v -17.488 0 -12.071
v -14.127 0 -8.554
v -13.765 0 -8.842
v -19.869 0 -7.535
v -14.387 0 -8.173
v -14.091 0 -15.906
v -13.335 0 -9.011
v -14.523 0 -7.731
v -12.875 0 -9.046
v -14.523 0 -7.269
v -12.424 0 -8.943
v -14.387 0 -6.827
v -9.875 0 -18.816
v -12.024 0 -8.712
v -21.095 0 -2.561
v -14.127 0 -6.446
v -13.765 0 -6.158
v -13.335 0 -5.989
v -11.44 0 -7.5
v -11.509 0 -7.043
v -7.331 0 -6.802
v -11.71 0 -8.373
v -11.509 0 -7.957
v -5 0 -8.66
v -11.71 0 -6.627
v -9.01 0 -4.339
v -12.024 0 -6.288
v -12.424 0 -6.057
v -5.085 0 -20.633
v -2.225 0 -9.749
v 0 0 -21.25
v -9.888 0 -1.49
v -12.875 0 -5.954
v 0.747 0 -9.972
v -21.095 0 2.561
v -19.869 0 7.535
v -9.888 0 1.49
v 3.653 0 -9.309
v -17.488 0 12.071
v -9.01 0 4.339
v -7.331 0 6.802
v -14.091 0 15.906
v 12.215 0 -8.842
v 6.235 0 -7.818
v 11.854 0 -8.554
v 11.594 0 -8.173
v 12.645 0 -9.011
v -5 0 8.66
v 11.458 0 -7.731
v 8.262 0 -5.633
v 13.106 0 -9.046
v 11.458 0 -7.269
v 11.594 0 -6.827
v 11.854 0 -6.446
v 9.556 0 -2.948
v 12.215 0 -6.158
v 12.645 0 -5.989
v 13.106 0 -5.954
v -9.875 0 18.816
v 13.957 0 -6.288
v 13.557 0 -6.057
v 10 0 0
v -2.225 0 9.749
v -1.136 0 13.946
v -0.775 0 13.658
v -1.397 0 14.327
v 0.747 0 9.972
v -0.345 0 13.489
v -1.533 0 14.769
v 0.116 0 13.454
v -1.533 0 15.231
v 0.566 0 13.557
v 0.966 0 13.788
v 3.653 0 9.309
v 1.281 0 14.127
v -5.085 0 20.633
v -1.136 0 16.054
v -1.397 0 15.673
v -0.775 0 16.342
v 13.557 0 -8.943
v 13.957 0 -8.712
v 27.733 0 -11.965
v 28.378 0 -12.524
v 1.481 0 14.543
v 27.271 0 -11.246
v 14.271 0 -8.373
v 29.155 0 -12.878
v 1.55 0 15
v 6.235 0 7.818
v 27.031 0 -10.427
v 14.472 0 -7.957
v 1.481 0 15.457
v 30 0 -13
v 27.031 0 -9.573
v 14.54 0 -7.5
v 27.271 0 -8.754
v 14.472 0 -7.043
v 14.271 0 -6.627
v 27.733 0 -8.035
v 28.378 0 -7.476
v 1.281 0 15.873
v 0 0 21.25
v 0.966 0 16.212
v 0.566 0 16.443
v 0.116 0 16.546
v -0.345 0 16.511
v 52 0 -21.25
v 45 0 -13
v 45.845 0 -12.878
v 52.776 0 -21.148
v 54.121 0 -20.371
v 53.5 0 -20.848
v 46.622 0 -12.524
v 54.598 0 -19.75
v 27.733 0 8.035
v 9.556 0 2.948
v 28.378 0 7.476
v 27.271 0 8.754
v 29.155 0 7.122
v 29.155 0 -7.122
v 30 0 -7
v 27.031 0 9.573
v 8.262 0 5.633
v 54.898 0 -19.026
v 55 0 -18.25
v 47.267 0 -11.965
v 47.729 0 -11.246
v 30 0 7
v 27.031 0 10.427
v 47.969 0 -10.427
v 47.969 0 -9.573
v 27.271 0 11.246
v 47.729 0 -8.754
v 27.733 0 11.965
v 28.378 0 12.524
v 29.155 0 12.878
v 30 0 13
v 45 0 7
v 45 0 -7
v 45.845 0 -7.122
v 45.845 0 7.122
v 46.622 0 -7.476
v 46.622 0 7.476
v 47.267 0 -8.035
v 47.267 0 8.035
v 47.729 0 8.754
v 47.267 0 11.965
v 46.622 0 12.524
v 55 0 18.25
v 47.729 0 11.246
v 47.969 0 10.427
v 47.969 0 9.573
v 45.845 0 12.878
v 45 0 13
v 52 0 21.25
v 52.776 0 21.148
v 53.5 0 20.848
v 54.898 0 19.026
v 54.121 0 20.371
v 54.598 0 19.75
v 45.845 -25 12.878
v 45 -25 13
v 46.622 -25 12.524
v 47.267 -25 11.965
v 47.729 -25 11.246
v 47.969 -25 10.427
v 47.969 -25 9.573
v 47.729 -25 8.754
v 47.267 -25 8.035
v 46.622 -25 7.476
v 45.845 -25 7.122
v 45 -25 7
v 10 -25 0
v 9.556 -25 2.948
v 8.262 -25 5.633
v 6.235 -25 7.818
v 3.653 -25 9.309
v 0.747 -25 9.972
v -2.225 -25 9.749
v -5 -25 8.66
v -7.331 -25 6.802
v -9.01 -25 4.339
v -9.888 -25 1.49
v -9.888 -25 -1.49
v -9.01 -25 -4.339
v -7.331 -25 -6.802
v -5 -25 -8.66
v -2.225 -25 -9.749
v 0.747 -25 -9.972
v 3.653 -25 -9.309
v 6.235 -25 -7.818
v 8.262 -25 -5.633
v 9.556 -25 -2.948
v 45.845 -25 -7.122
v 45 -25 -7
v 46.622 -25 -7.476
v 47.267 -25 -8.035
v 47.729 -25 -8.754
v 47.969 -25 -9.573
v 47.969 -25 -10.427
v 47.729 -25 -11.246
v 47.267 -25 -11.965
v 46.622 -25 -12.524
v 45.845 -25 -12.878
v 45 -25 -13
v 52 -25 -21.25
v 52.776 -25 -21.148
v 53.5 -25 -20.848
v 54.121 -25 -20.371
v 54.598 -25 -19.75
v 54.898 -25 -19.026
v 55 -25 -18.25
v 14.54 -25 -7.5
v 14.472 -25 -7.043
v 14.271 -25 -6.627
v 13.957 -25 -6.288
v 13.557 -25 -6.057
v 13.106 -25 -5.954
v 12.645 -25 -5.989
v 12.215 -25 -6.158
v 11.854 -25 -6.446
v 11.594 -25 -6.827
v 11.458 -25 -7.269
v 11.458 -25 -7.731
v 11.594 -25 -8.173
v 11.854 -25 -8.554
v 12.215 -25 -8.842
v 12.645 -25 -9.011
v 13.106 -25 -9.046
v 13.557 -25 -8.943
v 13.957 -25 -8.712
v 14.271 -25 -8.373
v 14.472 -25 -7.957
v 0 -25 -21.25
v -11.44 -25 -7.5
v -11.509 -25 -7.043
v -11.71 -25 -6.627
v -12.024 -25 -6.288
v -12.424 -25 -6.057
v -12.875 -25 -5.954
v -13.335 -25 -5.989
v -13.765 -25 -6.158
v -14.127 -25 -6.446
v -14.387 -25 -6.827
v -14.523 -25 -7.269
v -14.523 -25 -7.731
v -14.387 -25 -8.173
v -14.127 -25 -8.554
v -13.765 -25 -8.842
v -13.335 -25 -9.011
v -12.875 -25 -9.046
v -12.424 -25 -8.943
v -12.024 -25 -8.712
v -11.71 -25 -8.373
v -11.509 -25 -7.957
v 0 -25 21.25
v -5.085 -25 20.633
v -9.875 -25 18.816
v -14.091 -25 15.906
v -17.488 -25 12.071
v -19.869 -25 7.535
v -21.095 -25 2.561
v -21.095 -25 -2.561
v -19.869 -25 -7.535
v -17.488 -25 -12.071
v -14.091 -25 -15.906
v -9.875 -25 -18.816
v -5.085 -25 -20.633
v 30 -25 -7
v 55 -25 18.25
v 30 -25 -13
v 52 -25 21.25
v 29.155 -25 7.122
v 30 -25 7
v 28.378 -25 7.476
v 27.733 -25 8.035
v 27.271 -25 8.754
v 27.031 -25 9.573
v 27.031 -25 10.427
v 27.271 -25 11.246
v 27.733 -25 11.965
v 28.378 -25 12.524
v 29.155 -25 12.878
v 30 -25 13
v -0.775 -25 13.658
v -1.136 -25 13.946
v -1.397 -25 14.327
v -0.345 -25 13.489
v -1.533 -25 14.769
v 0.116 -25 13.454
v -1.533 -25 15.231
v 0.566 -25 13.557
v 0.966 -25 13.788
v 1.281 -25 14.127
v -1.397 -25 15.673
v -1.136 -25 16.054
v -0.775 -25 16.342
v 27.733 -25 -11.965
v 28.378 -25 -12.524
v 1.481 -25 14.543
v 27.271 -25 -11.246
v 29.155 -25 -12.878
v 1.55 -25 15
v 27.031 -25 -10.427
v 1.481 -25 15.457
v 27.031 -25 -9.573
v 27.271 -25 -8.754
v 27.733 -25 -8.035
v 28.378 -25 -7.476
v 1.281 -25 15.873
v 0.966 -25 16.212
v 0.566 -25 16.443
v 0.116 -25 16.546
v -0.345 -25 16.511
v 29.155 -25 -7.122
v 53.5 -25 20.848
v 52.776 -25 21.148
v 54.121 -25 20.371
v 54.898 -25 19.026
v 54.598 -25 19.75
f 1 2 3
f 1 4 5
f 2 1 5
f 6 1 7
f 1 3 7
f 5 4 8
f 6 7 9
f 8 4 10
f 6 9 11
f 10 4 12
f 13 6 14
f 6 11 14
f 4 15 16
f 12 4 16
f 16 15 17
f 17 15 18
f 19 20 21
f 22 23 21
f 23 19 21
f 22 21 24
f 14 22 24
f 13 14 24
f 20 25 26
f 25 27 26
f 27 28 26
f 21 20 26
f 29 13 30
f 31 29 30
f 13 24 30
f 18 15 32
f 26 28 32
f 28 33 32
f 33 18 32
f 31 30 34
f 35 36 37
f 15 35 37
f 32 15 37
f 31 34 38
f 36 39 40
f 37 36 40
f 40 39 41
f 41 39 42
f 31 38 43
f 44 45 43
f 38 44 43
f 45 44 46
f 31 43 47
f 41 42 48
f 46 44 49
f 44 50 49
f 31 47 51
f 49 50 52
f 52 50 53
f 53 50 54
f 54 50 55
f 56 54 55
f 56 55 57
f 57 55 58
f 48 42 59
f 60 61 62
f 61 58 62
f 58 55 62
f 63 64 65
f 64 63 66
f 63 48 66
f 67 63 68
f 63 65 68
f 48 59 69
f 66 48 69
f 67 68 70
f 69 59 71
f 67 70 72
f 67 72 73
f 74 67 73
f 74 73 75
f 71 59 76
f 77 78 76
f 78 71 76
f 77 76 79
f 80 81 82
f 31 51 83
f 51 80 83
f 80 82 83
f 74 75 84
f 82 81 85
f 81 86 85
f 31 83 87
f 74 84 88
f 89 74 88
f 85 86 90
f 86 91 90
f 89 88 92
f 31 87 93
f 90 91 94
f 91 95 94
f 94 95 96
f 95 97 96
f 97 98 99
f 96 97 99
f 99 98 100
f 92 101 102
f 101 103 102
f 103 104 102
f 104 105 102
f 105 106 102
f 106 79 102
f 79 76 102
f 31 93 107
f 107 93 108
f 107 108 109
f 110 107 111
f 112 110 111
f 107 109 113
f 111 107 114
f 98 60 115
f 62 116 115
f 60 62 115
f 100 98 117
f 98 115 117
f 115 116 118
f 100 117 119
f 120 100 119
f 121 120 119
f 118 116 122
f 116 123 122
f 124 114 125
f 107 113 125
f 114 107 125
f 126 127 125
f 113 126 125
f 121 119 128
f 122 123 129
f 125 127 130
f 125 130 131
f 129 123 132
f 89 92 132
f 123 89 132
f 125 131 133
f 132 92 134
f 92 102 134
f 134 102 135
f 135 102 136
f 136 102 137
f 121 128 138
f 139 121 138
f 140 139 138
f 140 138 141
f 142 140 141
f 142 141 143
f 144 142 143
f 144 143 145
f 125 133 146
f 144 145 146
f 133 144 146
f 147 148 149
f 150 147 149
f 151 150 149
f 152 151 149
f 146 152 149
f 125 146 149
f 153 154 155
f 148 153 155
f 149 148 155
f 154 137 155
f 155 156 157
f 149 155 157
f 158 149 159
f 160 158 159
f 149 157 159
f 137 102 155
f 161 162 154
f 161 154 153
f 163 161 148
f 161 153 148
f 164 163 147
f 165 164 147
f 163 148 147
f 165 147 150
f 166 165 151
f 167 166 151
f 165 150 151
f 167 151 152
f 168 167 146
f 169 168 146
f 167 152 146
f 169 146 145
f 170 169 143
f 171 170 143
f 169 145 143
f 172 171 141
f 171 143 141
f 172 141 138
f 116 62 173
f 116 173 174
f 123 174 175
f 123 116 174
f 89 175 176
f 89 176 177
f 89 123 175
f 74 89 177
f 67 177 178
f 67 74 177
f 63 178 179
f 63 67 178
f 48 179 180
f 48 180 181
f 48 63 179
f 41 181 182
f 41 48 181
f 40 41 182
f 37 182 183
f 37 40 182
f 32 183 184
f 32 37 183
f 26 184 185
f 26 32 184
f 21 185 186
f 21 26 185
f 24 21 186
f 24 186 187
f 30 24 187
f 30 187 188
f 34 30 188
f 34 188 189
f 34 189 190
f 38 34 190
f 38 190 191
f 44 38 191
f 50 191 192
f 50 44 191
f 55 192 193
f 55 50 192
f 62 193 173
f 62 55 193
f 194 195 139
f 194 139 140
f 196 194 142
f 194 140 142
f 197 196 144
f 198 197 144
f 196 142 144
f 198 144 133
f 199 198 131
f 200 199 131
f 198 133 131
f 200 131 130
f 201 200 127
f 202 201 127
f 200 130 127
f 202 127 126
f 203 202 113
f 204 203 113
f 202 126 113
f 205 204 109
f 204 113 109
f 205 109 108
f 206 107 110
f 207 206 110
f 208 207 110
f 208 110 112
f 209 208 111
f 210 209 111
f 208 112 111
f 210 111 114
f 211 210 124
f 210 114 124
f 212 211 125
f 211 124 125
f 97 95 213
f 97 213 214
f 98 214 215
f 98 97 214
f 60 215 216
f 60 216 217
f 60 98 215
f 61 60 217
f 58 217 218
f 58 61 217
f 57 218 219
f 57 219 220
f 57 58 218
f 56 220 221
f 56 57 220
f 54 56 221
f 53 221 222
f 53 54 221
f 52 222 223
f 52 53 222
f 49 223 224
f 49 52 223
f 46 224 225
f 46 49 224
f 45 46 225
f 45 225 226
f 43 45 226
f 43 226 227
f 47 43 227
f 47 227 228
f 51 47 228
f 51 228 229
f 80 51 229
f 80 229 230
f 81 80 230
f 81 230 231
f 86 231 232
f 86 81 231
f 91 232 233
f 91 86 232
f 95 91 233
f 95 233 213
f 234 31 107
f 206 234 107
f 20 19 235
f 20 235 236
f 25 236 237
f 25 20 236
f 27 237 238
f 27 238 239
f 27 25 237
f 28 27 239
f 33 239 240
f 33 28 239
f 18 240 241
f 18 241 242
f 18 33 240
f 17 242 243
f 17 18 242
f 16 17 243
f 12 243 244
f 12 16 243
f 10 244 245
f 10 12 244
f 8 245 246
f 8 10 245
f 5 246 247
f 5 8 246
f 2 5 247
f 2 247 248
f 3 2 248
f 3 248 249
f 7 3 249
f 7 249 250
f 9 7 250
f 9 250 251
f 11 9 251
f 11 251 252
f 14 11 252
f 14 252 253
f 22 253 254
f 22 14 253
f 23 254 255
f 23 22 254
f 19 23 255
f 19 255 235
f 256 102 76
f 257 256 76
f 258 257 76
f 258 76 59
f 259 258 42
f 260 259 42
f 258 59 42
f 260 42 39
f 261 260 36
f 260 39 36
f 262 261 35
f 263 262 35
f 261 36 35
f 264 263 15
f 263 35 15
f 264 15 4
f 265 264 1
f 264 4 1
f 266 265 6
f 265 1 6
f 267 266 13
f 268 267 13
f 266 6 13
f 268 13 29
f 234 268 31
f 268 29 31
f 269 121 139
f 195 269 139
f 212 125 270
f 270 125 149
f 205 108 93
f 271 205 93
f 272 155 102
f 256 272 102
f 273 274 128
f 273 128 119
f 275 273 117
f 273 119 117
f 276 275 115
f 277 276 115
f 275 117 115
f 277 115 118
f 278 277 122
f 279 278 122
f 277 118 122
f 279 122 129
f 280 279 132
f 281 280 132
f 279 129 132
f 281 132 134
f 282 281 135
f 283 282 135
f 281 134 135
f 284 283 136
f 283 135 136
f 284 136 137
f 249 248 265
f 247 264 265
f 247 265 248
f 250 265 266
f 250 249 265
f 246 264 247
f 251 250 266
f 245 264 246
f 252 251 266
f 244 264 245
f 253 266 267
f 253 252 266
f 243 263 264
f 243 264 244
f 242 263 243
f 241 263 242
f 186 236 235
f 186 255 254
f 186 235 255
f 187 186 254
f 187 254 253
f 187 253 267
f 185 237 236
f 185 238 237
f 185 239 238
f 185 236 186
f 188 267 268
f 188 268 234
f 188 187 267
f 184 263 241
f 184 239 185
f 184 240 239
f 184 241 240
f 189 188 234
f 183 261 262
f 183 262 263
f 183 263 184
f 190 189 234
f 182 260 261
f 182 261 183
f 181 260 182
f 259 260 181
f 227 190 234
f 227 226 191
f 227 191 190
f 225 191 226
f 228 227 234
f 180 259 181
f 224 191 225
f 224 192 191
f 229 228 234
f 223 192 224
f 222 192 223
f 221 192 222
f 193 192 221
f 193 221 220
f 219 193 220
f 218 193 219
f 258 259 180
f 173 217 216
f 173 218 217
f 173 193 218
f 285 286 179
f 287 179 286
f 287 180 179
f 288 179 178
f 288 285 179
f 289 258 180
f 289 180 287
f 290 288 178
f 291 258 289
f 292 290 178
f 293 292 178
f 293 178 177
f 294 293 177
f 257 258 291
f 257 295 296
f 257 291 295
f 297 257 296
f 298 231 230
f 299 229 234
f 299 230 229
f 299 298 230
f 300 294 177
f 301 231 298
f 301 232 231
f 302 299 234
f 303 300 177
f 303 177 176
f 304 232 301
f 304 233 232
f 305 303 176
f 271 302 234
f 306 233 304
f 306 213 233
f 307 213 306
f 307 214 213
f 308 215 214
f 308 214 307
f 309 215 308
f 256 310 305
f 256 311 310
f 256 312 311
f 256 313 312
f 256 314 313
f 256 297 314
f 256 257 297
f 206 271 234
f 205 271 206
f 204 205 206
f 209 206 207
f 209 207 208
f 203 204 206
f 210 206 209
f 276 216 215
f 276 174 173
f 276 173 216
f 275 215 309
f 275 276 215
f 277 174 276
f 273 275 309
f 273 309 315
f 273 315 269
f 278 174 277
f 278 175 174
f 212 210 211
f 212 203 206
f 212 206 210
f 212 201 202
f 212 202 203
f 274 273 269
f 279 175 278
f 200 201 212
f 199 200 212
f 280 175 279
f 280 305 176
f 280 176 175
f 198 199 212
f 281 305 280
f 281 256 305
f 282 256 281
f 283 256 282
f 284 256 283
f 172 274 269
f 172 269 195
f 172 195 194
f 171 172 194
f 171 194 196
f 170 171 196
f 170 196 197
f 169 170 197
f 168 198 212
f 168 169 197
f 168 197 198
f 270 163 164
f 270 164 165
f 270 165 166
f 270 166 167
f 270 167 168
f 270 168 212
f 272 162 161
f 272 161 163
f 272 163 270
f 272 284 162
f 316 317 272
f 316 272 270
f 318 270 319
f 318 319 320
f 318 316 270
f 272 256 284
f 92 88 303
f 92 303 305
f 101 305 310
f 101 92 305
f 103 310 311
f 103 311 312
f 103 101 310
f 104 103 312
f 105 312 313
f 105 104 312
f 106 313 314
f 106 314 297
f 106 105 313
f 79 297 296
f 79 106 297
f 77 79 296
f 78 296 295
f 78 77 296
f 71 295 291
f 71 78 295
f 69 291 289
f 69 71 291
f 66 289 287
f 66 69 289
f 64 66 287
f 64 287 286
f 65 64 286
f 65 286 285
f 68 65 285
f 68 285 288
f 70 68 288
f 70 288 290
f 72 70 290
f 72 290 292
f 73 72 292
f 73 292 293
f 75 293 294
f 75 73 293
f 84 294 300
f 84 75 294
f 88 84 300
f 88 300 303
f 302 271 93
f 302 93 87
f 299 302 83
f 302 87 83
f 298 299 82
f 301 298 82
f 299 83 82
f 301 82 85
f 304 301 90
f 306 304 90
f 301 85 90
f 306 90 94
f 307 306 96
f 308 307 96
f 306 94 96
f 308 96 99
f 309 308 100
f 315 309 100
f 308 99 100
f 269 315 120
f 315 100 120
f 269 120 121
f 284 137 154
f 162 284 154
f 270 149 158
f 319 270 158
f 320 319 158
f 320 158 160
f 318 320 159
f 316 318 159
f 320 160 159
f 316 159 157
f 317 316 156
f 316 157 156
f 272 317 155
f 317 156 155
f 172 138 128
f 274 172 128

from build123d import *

# Parameters (mm, degrees)
F0_R     = 1.55
F0_R_2   = 10
F1_DEPTH = 25


with BuildPart() as f1:
    # F0 (on Front) → F1 (new body)
    with BuildSketch(Plane.XZ):
        with BuildLine():
            Line((52, 21.25), (0, 21.25))
            ThreePointArc((0, 21.25), (15.026019, 15.026019), (21.25, 0))
            ThreePointArc((21.25, 0), (15.026019, -15.026019), (0, -21.25))
            Line((0, -21.25), (52, -21.25))
            ThreePointArc((52, -21.25), (54.12132, -20.37132), (55, -18.25))
            Line((55, -18.25), (55, 18.25))
            ThreePointArc((55, 18.25), (54.12132, 20.37132), (52, 21.25))
        make_face()
        with BuildLine():
            Line((45, -13), (30, -13))
            ThreePointArc((30, -13), (27, -10), (30, -7))
            Line((30, -7), (45, -7))
            ThreePointArc((45, -7), (48, -10), (45, -13))
        make_face(mode=Mode.SUBTRACT)
        with BuildLine():
            Line((45, 7), (30, 7))
            ThreePointArc((30, 7), (27, 10), (30, 13))
            Line((30, 13), (45, 13))
            ThreePointArc((45, 13), (48, 10), (45, 7))
        make_face(mode=Mode.SUBTRACT)
        with BuildLine():
            ThreePointArc((21.25, 0), (15.026019, 15.026019), (0, 21.25))
            ThreePointArc((0, 21.25), (-21.25, 0), (0, -21.25))
            ThreePointArc((0, -21.25), (15.026019, -15.026019), (21.25, 0))
        make_face()
        with Locations((-12.990381, -7.5)):
            Circle(F0_R, mode=Mode.SUBTRACT)
        with Locations((12.990381, -7.5)):
            Circle(F0_R, mode=Mode.SUBTRACT)
        Circle(F0_R_2, mode=Mode.SUBTRACT)
        with Locations((0, 15)):
            Circle(F0_R, mode=Mode.SUBTRACT)
    extrude(amount=F1_DEPTH)


solid = f1.part
